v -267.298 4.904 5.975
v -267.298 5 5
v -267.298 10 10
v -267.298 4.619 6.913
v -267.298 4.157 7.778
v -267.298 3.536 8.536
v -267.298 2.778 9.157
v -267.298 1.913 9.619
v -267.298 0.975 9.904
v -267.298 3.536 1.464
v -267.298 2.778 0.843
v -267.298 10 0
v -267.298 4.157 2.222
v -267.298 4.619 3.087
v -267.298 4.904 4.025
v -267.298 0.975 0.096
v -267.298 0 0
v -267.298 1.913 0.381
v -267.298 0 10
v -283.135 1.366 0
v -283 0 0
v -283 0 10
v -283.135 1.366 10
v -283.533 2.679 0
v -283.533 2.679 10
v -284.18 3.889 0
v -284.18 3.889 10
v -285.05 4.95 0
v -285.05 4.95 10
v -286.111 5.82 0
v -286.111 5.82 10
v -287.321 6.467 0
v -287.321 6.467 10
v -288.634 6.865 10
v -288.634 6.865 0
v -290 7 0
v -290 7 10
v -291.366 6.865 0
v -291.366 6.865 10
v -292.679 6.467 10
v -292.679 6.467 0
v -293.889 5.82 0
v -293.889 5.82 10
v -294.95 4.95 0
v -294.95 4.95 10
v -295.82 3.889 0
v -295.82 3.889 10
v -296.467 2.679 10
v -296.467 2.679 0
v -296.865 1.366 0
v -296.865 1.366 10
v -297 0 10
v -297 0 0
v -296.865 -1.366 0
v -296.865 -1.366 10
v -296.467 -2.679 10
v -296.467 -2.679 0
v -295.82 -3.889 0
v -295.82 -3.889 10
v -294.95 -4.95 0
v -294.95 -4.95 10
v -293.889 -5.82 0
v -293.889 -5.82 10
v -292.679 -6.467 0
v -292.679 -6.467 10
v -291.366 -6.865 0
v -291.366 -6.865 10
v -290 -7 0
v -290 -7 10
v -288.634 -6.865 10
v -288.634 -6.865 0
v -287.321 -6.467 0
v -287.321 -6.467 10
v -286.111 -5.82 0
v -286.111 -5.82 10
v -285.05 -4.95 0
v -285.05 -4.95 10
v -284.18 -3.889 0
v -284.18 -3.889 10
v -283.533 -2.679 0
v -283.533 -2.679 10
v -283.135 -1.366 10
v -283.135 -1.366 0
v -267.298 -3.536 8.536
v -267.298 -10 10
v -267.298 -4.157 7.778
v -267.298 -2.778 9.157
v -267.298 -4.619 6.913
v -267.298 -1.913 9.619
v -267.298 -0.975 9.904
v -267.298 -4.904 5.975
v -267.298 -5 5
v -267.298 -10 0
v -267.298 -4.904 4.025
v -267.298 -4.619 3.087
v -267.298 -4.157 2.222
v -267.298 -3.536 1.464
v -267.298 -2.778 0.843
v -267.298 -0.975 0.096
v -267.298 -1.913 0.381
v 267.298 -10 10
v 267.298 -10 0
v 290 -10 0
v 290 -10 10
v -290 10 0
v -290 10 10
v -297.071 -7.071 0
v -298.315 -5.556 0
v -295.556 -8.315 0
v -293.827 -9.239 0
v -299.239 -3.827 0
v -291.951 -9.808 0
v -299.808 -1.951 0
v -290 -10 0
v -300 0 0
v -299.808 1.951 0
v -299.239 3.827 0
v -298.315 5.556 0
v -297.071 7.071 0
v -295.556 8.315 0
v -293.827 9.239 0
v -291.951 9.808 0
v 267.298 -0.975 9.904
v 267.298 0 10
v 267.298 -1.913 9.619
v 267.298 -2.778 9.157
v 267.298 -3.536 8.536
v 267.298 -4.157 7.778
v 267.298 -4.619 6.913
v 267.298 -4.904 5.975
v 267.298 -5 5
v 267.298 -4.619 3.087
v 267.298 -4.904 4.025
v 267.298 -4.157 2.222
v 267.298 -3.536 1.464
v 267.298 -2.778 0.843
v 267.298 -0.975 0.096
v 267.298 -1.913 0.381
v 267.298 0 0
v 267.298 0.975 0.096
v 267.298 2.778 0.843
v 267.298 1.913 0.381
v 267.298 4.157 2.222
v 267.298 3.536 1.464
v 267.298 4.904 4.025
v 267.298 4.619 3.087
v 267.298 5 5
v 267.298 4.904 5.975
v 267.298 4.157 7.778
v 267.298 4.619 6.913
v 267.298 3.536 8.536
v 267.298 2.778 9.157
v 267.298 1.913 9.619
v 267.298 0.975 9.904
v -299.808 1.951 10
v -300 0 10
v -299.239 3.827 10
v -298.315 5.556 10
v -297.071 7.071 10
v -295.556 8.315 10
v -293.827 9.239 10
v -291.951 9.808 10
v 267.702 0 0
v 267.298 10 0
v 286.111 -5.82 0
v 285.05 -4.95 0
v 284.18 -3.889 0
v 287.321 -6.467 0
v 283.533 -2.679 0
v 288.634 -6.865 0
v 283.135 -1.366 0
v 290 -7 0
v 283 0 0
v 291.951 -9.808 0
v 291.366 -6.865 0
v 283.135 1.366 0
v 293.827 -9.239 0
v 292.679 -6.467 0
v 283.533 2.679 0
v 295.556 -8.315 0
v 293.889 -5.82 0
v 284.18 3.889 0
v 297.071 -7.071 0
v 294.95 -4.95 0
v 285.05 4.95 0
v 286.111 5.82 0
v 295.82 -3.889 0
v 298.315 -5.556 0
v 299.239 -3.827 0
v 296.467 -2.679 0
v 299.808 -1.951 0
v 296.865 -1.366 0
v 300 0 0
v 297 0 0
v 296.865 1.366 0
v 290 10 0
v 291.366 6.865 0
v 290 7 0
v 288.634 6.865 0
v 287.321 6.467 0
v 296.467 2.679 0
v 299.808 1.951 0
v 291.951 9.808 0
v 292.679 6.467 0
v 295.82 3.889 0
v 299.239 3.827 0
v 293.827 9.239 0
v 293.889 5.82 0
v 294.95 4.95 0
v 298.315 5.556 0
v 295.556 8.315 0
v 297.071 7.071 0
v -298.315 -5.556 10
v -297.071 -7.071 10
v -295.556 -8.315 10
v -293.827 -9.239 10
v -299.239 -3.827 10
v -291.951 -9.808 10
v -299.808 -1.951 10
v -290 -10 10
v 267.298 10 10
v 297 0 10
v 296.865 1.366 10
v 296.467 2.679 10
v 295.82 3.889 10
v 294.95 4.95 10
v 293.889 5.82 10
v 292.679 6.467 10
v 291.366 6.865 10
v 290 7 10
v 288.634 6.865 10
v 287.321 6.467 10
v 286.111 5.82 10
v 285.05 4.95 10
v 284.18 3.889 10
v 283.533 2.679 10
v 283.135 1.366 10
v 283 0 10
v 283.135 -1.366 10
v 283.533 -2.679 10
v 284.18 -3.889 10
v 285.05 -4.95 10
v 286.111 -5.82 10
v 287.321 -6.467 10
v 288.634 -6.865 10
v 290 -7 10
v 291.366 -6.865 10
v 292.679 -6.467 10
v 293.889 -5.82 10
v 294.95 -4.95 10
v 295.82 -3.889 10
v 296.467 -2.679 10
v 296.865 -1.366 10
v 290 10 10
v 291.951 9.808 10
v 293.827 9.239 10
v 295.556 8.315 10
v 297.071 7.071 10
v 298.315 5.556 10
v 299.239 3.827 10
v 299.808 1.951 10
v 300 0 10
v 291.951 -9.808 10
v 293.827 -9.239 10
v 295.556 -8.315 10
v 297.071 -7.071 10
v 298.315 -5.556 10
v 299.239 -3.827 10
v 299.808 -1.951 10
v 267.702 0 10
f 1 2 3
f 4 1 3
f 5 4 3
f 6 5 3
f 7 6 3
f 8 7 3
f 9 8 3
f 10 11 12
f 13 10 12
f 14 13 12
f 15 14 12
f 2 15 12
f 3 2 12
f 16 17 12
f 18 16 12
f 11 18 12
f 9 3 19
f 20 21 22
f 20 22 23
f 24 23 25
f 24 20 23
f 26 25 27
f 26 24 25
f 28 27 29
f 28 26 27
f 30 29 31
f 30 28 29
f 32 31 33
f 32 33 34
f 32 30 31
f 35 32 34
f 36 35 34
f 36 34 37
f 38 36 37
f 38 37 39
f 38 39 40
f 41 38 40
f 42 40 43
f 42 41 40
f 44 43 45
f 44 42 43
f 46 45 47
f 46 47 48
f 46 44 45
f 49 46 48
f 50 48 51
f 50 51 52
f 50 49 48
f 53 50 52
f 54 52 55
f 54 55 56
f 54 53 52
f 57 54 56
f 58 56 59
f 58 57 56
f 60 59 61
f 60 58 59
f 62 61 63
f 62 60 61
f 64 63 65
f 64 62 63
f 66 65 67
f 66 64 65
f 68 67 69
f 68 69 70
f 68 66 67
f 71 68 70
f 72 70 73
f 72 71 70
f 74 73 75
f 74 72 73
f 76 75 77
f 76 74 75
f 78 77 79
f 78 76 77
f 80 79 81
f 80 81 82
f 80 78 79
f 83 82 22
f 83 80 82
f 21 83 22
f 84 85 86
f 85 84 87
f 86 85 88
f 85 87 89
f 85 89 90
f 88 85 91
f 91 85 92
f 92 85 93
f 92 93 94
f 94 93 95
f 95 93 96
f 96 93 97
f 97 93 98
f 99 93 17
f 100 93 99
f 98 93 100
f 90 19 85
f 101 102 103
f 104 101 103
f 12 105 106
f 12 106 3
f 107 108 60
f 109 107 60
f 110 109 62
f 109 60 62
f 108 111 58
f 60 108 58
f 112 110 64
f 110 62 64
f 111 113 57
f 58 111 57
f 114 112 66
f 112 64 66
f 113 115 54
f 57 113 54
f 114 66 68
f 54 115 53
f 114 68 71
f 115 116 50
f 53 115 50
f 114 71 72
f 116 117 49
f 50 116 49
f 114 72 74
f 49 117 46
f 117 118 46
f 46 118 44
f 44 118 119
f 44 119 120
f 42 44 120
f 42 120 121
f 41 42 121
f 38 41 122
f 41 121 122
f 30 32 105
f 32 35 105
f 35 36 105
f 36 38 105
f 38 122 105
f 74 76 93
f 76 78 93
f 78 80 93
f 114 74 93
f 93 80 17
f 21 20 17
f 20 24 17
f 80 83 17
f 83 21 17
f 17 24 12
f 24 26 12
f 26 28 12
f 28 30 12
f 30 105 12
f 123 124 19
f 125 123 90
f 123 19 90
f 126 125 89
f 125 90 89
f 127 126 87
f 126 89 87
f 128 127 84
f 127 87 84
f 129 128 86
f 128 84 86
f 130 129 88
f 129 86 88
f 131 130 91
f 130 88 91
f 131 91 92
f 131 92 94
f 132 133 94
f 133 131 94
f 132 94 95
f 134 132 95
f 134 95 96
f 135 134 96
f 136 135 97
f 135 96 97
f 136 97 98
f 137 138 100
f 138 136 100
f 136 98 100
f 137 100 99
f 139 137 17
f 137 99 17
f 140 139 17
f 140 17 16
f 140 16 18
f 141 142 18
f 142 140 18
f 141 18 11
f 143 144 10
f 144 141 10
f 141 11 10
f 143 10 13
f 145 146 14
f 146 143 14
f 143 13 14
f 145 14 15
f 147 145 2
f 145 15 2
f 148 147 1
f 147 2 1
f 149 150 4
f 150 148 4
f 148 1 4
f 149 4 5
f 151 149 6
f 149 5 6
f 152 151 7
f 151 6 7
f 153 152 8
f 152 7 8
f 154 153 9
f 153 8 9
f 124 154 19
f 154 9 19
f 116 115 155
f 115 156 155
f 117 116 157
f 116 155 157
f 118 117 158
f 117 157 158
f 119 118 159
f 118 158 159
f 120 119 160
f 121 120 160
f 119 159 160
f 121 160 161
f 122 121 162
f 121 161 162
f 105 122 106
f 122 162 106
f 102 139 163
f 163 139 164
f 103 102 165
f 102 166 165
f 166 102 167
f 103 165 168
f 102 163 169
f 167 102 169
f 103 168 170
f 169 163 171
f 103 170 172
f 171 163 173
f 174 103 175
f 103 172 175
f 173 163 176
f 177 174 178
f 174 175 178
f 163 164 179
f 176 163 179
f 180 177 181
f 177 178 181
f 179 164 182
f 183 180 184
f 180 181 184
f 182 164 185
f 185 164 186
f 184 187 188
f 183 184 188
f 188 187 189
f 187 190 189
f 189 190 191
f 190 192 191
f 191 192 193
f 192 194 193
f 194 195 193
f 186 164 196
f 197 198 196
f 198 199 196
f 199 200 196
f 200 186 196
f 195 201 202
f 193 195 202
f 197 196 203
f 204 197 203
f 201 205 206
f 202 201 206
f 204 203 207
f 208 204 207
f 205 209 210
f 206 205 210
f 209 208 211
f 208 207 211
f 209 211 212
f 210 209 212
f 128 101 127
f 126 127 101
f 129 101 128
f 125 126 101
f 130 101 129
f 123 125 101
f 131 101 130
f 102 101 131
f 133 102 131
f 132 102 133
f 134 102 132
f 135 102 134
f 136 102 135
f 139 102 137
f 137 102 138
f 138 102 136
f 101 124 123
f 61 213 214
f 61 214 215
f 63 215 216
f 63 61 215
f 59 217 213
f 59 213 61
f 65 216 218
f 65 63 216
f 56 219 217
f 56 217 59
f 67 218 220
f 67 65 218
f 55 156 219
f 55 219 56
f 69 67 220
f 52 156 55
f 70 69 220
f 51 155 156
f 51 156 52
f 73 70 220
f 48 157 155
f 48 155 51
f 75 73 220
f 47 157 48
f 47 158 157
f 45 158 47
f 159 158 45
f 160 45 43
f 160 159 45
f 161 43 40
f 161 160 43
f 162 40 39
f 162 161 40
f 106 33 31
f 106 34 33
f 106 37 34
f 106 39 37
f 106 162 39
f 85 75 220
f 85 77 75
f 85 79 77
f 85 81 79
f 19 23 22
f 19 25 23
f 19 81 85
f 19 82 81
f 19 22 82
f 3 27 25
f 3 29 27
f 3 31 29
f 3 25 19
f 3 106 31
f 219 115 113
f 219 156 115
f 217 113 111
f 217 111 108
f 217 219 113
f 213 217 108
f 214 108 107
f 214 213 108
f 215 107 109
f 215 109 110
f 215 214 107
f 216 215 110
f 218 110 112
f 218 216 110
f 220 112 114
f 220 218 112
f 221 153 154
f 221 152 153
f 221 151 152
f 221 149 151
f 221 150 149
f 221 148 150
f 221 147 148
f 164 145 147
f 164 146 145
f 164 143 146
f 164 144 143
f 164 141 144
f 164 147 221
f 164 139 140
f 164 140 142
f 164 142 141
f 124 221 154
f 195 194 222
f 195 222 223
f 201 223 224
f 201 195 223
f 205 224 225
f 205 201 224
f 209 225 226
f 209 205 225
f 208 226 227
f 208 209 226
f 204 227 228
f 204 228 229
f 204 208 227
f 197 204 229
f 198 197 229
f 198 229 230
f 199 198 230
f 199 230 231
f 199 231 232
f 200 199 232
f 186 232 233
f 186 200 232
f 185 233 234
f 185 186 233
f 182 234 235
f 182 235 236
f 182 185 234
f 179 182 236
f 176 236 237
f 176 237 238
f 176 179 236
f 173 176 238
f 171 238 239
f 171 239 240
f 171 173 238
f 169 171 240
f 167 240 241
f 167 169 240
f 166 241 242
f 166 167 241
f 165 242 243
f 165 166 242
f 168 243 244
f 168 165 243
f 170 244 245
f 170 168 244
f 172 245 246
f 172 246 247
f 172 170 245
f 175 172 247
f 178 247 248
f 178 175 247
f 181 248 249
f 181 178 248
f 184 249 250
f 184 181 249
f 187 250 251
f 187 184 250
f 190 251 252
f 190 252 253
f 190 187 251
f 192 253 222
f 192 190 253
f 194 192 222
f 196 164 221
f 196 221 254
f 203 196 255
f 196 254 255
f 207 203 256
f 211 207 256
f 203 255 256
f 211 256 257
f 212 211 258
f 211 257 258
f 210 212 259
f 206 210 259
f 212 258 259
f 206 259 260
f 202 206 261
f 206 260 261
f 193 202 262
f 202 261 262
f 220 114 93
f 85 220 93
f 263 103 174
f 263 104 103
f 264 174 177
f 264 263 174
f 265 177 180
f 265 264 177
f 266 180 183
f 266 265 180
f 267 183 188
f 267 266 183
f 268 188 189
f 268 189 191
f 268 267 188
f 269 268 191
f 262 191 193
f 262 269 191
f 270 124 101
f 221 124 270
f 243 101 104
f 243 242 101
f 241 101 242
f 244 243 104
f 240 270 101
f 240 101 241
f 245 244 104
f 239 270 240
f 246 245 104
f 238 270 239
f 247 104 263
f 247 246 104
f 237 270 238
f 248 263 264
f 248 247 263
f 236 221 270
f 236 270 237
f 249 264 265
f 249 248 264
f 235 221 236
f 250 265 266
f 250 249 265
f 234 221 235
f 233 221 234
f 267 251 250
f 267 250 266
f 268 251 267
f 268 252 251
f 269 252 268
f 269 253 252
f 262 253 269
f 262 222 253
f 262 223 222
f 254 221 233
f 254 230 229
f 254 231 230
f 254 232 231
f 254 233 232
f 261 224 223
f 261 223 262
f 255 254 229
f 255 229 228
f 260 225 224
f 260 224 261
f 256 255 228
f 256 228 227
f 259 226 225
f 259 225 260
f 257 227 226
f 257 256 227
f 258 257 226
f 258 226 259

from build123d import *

# Parameters (mm, degrees)
SKETCH_1_W          = 600
SKETCH_1_H          = 20
SKETCH_1_R          = 7
EXTRUDE_1_DEPTH     = 10
FILLET_1_R          = 10
SKETCH1_W           = 534.59629528
SKETCH1_H           = 41.86621972
CUT_EXTRUDE1_DEPTH  = 19
SKETCH2_R           = 5
BOSS_EXTRUDE1_DEPTH = 535


with BuildPart() as part:
    # 草图1 → 凸台-拉伸1 (new body)
    with BuildSketch(Plane.XY):
        Rectangle(SKETCH_1_W, SKETCH_1_H)
        with Locations((-290, 0)):
            Circle(SKETCH_1_R, mode=Mode.SUBTRACT)
        with Locations((290, 0)):
            Circle(SKETCH_1_R, mode=Mode.SUBTRACT)
    extrude(amount=EXTRUDE_1_DEPTH)

    # 圆角1
    fillet_1_edges = [part.edges().sort_by_distance(p)[0] for p in [
        (300, 10, 5),
        (300, -10, 5),
        (-300, -10, 5),
        (-300, 10, 5),
    ]]
    fillet(fillet_1_edges, radius=FILLET_1_R - 0.0001)  # a hair under: the kernel refuses the full size

    # Sketch1 → Cut-Extrude1 (cut)
    with BuildSketch(Plane.XY):
        Rectangle(SKETCH1_W, SKETCH1_H)
    extrude(amount=CUT_EXTRUDE1_DEPTH, mode=Mode.SUBTRACT)


with BuildPart() as cut_extrude1_piece_1:
    # of the separate pieces the step leaves, piece 1, a body of its own (cut_extrude1_pieces)
    add(part.part.solids().sort_by_distance((-290.0001, -10, 0))[0])



with BuildPart() as cut_extrude1_piece_2:
    # of the separate pieces the step leaves, piece 2, a body of its own (cut_extrude1_pieces)
    add(part.part.solids().sort_by_distance((267.29814764, -10, 0))[0])


with BuildPart() as cut_extrude1_piece_1_1:
    add(cut_extrude1_piece_1.part)

    add(cut_extrude1_piece_2.part)  # Boss-Extrude1 merges Cut-Extrude1 piece 2
    # Sketch2 → Boss-Extrude1 (add)
    with BuildSketch(Plane(origin=(-267.29814764, 0, 0), x_dir=(0, 0, -1), z_dir=(1, 0, 0))):
        with Locations(Location((-5, 0, 0), (0, 0, 180))):
            Circle(SKETCH2_R)
    extrude(amount=BOSS_EXTRUDE1_DEPTH)


solid = cut_extrude1_piece_1_1.part
